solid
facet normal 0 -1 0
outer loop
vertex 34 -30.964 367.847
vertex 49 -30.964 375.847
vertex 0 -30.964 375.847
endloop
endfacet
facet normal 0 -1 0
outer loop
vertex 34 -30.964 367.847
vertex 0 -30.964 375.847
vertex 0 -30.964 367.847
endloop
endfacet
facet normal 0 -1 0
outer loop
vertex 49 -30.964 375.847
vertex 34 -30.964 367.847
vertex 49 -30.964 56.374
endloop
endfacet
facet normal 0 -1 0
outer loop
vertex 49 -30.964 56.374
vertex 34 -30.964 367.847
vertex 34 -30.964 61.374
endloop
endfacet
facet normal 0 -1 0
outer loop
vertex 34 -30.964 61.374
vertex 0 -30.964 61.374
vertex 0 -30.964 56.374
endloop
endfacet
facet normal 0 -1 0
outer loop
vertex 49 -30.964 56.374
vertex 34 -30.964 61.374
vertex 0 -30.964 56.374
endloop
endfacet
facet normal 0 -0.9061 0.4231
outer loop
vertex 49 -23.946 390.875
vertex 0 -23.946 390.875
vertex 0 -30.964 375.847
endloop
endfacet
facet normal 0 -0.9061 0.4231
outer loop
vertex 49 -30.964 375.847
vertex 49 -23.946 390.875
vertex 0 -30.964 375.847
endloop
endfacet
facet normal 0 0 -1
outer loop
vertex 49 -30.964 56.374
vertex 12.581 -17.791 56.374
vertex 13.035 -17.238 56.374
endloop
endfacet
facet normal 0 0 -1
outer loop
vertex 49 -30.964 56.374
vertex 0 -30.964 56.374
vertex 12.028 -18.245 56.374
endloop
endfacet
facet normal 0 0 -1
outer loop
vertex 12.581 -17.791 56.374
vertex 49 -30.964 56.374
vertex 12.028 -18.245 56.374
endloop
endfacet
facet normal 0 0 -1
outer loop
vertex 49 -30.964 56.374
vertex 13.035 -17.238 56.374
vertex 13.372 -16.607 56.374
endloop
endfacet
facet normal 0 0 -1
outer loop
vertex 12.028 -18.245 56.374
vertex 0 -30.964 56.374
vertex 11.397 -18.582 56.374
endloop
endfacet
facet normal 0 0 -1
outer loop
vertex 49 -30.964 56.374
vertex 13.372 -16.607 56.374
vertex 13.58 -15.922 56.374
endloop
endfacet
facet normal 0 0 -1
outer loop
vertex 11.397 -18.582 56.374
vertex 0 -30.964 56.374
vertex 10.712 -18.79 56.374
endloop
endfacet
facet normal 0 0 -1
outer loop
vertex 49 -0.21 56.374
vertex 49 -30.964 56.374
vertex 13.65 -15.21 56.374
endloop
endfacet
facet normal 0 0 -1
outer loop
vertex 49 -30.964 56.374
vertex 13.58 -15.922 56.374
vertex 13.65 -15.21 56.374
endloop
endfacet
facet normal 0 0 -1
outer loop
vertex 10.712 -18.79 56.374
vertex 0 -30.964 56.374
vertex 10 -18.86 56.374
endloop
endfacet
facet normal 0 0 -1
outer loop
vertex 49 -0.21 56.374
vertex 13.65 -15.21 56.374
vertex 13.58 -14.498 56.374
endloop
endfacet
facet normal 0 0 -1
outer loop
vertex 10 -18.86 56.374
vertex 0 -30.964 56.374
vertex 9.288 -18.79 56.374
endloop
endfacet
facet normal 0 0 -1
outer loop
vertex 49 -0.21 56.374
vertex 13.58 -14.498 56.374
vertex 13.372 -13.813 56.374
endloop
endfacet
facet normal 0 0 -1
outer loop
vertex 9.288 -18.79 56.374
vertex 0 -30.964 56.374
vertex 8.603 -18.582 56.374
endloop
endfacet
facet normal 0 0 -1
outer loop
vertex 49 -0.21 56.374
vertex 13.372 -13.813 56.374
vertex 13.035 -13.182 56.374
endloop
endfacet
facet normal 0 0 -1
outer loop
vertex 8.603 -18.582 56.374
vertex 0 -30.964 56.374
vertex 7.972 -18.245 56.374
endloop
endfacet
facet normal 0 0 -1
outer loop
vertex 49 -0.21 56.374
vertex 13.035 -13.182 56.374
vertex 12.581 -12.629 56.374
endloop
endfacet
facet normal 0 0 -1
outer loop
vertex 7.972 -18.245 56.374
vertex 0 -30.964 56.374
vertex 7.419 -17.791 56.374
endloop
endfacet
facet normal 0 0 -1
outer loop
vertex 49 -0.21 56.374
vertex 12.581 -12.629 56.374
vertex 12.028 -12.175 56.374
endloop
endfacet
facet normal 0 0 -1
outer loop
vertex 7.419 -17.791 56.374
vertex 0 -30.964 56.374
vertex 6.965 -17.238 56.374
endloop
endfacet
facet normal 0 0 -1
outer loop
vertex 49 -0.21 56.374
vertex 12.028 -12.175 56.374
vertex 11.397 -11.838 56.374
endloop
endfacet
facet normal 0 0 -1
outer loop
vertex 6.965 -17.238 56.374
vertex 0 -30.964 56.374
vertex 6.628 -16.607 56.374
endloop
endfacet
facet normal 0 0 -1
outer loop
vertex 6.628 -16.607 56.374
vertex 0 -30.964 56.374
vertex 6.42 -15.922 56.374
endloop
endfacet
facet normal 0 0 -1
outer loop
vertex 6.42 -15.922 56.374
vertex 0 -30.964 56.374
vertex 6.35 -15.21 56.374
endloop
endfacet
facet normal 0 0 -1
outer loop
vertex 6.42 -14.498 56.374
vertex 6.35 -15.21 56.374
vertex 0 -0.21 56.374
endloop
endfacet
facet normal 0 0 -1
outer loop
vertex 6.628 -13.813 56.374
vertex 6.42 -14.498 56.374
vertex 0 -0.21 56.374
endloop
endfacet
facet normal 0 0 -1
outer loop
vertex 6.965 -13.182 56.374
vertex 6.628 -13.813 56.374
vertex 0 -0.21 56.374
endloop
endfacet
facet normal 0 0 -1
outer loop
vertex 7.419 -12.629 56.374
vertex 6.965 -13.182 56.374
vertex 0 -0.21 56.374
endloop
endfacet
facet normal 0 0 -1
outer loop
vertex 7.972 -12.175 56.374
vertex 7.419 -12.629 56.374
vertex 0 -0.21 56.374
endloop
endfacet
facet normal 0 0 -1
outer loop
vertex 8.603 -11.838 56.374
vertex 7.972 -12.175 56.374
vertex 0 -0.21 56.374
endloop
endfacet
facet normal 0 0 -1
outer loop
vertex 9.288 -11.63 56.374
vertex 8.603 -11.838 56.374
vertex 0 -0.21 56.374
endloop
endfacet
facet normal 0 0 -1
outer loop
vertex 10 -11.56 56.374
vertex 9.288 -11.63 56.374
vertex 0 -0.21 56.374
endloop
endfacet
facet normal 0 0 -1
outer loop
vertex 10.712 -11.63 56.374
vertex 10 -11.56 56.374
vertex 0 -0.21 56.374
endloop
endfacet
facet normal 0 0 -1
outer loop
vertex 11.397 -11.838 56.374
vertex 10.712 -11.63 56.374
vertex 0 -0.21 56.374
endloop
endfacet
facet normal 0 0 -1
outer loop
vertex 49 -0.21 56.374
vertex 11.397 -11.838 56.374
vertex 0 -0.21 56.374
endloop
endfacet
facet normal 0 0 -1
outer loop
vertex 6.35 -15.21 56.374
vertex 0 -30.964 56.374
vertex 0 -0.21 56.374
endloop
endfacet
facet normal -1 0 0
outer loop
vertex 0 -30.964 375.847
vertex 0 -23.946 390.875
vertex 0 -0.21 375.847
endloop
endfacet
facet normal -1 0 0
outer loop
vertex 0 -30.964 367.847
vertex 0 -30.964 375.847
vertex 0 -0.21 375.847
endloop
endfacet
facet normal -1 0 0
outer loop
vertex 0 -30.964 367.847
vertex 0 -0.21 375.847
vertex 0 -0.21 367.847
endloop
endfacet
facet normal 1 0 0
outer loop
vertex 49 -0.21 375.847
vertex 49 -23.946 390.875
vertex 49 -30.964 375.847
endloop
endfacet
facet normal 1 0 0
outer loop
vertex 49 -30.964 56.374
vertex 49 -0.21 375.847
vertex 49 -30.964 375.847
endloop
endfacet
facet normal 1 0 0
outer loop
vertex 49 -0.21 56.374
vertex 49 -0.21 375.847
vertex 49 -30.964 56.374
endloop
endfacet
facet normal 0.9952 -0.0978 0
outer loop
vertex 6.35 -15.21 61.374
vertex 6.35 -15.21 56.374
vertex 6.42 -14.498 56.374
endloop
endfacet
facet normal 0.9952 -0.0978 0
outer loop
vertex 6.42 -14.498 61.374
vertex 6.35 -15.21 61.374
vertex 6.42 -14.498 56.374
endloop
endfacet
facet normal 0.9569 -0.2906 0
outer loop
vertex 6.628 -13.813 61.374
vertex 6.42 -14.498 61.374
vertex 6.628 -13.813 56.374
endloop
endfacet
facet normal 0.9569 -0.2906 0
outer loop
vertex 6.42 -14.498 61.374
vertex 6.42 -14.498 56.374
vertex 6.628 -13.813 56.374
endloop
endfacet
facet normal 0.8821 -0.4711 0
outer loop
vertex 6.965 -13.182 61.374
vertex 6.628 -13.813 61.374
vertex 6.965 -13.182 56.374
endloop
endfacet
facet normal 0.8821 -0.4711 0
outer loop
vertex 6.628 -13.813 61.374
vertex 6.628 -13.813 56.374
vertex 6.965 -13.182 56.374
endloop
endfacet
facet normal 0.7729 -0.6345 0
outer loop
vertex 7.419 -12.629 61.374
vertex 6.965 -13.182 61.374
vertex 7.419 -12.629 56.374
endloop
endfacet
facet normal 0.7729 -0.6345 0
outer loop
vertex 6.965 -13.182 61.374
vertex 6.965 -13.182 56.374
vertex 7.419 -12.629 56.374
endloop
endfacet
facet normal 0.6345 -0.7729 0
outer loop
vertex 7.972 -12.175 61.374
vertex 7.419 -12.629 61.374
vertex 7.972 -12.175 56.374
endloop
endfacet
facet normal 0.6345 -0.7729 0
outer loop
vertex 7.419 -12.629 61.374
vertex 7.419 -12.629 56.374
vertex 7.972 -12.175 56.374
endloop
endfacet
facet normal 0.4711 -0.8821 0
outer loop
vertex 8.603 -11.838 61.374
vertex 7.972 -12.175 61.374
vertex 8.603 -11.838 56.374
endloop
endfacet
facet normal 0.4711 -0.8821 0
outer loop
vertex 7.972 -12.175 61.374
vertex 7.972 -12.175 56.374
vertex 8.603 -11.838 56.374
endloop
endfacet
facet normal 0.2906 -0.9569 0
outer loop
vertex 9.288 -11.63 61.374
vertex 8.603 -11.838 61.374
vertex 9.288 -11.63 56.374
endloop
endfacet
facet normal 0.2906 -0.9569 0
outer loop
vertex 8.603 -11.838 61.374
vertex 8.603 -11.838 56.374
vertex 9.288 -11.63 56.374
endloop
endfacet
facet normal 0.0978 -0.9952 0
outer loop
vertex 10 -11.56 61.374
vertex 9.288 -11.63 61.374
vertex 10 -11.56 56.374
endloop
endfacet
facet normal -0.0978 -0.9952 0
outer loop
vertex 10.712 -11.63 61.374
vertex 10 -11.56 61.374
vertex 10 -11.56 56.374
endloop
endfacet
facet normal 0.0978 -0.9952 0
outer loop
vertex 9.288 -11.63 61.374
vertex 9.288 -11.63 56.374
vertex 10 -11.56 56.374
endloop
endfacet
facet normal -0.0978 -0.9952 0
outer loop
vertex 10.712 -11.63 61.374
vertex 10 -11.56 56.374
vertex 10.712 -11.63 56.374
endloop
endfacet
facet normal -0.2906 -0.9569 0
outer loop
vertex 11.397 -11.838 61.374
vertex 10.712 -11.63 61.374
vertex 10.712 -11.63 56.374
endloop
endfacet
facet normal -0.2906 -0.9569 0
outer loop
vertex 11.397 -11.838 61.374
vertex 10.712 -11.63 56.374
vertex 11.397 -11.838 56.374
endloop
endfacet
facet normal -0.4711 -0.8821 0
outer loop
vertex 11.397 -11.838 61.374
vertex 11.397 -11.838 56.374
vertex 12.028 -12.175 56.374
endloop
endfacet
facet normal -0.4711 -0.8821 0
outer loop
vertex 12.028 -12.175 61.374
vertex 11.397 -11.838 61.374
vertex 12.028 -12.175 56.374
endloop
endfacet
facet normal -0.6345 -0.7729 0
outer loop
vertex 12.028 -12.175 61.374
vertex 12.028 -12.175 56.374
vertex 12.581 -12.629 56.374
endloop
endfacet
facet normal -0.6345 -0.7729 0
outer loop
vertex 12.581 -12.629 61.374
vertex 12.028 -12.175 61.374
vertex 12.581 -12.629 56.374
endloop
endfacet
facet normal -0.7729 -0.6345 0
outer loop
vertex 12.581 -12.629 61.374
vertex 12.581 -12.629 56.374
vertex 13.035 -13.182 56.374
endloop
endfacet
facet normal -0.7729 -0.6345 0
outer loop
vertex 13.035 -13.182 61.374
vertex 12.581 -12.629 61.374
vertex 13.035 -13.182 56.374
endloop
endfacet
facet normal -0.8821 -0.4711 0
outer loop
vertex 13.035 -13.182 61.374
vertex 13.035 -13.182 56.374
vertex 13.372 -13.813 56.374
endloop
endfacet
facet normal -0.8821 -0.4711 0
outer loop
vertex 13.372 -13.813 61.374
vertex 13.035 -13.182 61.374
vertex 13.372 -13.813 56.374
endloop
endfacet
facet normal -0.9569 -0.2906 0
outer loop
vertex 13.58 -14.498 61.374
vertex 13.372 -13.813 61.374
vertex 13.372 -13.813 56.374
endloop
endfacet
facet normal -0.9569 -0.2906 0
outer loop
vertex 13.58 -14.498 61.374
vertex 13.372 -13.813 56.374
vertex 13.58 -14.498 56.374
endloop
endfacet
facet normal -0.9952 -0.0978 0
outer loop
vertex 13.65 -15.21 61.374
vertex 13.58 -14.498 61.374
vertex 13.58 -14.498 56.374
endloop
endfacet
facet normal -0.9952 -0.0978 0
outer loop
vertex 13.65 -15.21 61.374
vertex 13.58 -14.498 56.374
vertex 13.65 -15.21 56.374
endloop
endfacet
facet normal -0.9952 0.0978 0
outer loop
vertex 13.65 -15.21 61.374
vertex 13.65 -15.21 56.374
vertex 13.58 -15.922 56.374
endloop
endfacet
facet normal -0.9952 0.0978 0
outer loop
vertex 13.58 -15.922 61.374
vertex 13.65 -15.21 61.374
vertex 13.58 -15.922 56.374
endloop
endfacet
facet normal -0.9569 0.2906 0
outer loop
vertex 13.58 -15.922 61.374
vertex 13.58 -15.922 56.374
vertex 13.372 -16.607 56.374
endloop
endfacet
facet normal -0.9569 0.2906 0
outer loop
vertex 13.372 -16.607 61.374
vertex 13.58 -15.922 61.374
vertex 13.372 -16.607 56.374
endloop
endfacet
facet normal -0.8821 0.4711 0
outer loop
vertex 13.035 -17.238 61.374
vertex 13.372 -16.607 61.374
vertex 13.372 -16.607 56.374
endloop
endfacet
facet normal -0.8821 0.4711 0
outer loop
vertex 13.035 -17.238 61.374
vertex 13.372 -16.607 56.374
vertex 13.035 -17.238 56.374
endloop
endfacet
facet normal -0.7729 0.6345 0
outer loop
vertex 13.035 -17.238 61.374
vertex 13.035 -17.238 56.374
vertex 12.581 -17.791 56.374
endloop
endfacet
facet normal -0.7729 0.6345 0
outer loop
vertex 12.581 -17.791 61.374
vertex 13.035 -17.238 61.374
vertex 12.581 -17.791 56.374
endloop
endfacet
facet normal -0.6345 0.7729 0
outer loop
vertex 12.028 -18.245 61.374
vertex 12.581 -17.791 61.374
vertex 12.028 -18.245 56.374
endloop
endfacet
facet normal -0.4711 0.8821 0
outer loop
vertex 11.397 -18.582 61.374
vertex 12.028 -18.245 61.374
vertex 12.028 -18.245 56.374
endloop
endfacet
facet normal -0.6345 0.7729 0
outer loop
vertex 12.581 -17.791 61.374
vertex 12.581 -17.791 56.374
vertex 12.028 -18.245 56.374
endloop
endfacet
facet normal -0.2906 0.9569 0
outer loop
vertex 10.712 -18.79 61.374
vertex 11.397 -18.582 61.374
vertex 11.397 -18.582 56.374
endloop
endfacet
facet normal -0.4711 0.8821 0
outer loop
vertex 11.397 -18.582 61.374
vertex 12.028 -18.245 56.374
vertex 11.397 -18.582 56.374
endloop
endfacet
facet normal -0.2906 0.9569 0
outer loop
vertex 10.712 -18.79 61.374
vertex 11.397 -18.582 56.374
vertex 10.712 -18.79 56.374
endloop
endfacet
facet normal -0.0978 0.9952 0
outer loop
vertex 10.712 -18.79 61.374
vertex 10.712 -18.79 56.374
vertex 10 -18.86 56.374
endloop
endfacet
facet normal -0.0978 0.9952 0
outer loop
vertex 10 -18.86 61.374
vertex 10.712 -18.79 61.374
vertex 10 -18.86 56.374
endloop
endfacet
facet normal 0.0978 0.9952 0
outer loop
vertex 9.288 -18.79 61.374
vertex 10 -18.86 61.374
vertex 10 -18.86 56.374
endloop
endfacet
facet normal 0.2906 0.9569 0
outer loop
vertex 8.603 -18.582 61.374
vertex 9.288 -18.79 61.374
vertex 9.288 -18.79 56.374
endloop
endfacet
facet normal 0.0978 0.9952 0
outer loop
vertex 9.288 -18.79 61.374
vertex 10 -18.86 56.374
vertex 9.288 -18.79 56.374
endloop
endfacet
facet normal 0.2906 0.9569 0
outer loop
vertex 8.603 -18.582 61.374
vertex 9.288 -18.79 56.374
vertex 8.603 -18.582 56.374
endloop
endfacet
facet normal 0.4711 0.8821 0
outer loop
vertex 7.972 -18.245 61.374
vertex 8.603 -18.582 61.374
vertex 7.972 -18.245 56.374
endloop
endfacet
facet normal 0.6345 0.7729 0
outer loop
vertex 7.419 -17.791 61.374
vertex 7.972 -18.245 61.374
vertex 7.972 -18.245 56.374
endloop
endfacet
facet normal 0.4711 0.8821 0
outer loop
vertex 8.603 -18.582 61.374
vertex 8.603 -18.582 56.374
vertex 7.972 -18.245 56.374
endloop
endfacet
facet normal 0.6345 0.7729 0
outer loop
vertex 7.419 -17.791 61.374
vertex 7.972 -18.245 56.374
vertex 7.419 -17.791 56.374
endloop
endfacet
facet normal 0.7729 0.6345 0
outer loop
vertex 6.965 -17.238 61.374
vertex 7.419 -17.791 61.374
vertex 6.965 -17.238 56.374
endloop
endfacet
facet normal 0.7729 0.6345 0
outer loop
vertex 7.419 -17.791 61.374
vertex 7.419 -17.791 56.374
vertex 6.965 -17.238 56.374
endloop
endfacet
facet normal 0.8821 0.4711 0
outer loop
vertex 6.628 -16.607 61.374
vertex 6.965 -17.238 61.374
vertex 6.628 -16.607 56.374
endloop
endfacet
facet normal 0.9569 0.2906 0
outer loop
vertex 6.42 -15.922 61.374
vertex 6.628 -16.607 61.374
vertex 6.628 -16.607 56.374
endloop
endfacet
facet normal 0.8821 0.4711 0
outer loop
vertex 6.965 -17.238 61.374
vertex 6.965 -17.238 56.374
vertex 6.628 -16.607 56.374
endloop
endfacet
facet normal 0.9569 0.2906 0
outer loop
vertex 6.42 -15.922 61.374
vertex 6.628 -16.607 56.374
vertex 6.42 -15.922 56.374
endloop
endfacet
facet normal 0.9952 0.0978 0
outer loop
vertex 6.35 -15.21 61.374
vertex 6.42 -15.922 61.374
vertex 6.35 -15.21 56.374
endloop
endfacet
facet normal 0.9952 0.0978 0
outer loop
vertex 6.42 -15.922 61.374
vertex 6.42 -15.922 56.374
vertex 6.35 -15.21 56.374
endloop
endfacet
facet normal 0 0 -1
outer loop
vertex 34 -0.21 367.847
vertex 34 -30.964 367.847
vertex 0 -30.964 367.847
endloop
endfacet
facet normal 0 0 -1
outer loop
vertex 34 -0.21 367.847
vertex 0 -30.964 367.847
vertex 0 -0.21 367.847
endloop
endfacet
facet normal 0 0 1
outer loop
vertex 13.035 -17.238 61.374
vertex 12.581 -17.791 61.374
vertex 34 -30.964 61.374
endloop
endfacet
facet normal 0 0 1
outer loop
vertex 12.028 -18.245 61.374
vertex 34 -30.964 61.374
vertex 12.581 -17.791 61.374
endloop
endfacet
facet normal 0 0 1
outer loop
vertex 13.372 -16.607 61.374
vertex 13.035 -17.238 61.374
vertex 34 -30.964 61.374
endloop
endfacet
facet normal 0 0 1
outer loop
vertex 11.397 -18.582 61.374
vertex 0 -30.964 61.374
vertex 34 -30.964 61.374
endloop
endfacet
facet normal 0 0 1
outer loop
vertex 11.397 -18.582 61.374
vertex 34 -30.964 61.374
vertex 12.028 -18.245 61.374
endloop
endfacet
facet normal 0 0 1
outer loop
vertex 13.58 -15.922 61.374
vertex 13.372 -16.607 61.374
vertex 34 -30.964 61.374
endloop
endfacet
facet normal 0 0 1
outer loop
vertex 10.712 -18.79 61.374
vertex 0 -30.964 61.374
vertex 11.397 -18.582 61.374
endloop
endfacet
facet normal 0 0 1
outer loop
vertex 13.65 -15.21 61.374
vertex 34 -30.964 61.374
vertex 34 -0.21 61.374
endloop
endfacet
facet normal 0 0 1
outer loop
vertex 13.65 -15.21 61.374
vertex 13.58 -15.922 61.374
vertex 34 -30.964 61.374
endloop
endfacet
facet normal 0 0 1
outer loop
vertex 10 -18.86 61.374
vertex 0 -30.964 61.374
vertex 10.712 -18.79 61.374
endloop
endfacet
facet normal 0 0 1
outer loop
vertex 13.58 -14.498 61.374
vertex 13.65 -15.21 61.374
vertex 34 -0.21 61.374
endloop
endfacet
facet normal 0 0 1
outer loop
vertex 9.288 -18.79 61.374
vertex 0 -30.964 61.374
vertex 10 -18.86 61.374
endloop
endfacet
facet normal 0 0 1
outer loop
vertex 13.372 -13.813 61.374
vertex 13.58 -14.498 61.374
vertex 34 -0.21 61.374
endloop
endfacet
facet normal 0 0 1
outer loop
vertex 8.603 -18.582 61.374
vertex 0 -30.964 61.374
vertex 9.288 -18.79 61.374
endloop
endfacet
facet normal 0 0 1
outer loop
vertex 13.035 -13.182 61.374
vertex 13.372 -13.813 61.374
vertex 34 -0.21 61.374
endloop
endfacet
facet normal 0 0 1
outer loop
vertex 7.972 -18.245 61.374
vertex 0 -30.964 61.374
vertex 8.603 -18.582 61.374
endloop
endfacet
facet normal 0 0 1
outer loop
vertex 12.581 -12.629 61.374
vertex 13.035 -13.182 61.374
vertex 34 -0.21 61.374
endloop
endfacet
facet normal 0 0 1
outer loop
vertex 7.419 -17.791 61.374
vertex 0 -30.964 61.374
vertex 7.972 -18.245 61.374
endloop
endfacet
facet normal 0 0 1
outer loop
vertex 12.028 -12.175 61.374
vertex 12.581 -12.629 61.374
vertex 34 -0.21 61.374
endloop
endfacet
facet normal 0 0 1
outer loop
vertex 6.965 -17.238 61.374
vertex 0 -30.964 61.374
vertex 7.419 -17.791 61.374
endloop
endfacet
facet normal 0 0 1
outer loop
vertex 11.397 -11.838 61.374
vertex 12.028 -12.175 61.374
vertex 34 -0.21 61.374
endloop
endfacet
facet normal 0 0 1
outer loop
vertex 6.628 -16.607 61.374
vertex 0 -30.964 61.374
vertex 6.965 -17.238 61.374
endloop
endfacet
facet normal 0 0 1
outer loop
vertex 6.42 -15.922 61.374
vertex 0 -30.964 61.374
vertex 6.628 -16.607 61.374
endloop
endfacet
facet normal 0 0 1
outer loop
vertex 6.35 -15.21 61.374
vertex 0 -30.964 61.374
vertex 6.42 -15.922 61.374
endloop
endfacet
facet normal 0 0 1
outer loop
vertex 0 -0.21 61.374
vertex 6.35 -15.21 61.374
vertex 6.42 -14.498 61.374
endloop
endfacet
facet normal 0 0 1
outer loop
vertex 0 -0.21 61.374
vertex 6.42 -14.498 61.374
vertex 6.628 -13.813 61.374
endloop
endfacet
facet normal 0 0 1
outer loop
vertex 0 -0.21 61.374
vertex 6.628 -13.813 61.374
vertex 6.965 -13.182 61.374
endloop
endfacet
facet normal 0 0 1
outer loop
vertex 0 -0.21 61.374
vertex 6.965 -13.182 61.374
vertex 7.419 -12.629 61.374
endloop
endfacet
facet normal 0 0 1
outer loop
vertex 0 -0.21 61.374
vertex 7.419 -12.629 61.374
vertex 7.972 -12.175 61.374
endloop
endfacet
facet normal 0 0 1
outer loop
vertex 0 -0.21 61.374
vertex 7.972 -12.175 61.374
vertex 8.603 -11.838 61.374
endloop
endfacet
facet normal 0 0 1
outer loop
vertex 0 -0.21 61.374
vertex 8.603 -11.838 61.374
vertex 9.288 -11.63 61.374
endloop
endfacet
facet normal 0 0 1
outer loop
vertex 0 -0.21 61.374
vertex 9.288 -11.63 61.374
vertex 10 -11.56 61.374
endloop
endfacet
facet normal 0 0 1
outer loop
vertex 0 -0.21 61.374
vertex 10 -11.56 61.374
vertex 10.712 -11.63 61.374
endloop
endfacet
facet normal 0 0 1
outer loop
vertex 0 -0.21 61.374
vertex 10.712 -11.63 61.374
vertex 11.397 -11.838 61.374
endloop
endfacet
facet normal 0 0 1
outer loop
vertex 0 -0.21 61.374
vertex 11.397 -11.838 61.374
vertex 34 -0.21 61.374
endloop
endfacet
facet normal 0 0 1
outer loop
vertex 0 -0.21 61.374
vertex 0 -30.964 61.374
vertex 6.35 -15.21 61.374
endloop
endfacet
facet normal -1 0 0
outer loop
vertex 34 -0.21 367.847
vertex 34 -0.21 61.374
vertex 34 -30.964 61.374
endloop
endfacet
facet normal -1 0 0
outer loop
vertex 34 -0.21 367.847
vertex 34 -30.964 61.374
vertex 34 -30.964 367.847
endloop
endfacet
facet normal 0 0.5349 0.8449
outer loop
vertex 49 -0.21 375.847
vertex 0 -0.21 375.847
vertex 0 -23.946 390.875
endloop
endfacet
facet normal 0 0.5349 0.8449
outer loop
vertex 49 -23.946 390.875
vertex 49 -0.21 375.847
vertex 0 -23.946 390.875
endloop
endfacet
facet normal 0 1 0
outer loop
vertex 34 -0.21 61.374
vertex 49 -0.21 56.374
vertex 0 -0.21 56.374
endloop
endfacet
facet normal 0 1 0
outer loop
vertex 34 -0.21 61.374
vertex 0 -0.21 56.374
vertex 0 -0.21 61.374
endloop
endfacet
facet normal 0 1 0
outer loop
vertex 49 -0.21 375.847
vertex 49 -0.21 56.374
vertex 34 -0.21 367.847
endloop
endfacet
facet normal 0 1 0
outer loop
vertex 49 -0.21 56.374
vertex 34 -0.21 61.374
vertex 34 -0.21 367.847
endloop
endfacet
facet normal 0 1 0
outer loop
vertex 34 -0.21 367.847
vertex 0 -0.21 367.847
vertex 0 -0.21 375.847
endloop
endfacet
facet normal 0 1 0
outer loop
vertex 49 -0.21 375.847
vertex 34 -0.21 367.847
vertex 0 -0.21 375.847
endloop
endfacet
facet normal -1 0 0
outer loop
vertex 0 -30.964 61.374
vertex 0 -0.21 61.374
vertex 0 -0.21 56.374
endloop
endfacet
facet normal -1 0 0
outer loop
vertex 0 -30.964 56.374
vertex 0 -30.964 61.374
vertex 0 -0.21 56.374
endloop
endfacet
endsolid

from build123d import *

# Parameters (mm, degrees)
BOSS_EXTRUDE1_DEPTH = 49
SKETCH2_W           = 306.472298026
SKETCH2_H           = 30.75390082
CUT_EXTRUDE1_DEPTH  = 34
SKETCH4_R           = 3.65
CUT_EXTRUDE2_DEPTH  = 10


with BuildPart() as part:
    # Sketch1 → Boss-Extrude1 (new body)
    with BuildSketch(Plane(origin=(0, 0, 0), x_dir=(0, 0, -1), z_dir=(1, 0, 0))):
        Polygon((-375.84656477, -0.209706312), (-390.875399113, -23.945501074), (-375.84656477, -30.963607132), (-56.374266744, -30.963607132), (-56.374266744, -0.209706312), align=None)
    extrude(amount=BOSS_EXTRUDE1_DEPTH)

    # Sketch2 → Cut-Extrude1 (cut)
    with BuildSketch(Plane.ZY):
        with Locations((214.610415757, -15.586656722)):
            Rectangle(SKETCH2_W, SKETCH2_H)
    extrude(amount=-CUT_EXTRUDE1_DEPTH, mode=Mode.SUBTRACT)

    # Sketch4 → Cut-Extrude2 (cut)
    with BuildSketch(Plane(origin=(0, 0, 56.374266744), x_dir=(-1, 0, 0), z_dir=(0, 0, -1))):
        with Locations((-10, -15.209706312)):
            Circle(SKETCH4_R)
    extrude(amount=-CUT_EXTRUDE2_DEPTH, mode=Mode.SUBTRACT)


solid = part.part
